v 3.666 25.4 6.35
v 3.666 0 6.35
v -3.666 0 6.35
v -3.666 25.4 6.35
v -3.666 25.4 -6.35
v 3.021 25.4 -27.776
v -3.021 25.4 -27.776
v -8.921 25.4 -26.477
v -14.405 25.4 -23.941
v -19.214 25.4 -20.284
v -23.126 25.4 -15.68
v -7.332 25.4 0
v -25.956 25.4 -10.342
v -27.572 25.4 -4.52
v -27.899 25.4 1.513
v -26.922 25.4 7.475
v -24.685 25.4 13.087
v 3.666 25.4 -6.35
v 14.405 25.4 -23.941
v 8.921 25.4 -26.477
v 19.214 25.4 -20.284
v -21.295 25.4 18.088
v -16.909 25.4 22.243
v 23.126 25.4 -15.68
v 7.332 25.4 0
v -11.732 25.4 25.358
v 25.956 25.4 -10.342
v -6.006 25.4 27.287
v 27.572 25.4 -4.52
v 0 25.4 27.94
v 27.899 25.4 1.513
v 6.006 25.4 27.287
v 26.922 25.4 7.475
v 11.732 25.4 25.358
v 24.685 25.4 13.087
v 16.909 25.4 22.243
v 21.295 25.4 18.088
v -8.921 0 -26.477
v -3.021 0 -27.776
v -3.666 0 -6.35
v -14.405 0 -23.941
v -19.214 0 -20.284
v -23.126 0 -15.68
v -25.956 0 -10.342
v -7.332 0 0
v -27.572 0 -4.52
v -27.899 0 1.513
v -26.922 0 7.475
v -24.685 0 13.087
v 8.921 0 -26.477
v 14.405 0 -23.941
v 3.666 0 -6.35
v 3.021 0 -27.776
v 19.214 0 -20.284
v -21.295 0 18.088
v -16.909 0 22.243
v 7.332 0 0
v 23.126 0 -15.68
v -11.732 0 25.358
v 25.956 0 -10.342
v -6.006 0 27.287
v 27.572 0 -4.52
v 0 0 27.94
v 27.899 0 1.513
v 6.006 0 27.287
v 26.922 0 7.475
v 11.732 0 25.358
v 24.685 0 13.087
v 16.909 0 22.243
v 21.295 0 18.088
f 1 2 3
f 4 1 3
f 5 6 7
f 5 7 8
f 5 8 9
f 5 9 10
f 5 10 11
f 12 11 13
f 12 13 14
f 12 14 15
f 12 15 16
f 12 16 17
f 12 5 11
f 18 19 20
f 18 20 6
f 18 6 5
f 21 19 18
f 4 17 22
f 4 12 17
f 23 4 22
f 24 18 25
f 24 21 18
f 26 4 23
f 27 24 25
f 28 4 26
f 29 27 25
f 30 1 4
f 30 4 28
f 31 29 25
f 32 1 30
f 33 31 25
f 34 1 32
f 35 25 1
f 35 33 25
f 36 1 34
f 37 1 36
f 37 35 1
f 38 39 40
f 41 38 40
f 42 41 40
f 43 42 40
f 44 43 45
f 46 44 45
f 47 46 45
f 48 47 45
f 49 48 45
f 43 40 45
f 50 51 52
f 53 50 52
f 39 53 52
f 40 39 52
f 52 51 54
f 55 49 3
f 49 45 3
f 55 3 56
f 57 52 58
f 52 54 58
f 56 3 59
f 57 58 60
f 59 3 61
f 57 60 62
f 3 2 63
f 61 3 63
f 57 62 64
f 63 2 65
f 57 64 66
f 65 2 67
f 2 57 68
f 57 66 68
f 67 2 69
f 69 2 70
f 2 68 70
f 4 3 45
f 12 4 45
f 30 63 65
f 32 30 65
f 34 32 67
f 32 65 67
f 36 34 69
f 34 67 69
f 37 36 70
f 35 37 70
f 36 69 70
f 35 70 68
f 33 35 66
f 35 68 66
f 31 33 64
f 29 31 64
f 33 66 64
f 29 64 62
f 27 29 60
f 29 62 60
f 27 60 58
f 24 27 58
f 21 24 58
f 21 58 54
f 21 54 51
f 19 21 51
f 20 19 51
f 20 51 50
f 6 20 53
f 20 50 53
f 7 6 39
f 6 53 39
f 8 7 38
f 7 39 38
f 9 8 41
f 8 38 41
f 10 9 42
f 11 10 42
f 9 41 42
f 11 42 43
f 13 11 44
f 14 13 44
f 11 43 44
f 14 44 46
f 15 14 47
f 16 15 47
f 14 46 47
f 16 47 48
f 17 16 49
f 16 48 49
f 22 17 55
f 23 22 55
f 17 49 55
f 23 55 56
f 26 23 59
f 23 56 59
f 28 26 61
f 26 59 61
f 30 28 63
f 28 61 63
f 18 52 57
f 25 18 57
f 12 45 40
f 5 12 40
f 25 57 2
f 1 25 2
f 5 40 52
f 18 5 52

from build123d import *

# Parameters (mm, degrees)
SKETCH1_R           = 27.94
BOSS_EXTRUDE1_DEPTH = 25.4
CUT_EXTRUDE1_DEPTH  = 47.972834703


with BuildPart() as part:
    # Sketch1 → Boss-Extrude1 (new body)
    with BuildSketch(Plane(origin=(0, 0, 0), x_dir=(1, 0, 0), z_dir=(0, 1, 0))):
        with Locations(Location((0, 0, 0), (0, 0, 270))):
            Circle(SKETCH1_R)
    extrude(amount=BOSS_EXTRUDE1_DEPTH)

    # Sketch2 → Cut-Extrude1 (cut, through all)
    with BuildSketch(Plane.XZ):
        Polygon((-3.666174209, 6.35), (-7.332348419, 0), (-3.666174209, -6.35), (3.666174209, -6.35), (7.332348419, 0), (3.666174209, 6.35), align=None)
    extrude(amount=-CUT_EXTRUDE1_DEPTH, mode=Mode.SUBTRACT)


solid = part.part
